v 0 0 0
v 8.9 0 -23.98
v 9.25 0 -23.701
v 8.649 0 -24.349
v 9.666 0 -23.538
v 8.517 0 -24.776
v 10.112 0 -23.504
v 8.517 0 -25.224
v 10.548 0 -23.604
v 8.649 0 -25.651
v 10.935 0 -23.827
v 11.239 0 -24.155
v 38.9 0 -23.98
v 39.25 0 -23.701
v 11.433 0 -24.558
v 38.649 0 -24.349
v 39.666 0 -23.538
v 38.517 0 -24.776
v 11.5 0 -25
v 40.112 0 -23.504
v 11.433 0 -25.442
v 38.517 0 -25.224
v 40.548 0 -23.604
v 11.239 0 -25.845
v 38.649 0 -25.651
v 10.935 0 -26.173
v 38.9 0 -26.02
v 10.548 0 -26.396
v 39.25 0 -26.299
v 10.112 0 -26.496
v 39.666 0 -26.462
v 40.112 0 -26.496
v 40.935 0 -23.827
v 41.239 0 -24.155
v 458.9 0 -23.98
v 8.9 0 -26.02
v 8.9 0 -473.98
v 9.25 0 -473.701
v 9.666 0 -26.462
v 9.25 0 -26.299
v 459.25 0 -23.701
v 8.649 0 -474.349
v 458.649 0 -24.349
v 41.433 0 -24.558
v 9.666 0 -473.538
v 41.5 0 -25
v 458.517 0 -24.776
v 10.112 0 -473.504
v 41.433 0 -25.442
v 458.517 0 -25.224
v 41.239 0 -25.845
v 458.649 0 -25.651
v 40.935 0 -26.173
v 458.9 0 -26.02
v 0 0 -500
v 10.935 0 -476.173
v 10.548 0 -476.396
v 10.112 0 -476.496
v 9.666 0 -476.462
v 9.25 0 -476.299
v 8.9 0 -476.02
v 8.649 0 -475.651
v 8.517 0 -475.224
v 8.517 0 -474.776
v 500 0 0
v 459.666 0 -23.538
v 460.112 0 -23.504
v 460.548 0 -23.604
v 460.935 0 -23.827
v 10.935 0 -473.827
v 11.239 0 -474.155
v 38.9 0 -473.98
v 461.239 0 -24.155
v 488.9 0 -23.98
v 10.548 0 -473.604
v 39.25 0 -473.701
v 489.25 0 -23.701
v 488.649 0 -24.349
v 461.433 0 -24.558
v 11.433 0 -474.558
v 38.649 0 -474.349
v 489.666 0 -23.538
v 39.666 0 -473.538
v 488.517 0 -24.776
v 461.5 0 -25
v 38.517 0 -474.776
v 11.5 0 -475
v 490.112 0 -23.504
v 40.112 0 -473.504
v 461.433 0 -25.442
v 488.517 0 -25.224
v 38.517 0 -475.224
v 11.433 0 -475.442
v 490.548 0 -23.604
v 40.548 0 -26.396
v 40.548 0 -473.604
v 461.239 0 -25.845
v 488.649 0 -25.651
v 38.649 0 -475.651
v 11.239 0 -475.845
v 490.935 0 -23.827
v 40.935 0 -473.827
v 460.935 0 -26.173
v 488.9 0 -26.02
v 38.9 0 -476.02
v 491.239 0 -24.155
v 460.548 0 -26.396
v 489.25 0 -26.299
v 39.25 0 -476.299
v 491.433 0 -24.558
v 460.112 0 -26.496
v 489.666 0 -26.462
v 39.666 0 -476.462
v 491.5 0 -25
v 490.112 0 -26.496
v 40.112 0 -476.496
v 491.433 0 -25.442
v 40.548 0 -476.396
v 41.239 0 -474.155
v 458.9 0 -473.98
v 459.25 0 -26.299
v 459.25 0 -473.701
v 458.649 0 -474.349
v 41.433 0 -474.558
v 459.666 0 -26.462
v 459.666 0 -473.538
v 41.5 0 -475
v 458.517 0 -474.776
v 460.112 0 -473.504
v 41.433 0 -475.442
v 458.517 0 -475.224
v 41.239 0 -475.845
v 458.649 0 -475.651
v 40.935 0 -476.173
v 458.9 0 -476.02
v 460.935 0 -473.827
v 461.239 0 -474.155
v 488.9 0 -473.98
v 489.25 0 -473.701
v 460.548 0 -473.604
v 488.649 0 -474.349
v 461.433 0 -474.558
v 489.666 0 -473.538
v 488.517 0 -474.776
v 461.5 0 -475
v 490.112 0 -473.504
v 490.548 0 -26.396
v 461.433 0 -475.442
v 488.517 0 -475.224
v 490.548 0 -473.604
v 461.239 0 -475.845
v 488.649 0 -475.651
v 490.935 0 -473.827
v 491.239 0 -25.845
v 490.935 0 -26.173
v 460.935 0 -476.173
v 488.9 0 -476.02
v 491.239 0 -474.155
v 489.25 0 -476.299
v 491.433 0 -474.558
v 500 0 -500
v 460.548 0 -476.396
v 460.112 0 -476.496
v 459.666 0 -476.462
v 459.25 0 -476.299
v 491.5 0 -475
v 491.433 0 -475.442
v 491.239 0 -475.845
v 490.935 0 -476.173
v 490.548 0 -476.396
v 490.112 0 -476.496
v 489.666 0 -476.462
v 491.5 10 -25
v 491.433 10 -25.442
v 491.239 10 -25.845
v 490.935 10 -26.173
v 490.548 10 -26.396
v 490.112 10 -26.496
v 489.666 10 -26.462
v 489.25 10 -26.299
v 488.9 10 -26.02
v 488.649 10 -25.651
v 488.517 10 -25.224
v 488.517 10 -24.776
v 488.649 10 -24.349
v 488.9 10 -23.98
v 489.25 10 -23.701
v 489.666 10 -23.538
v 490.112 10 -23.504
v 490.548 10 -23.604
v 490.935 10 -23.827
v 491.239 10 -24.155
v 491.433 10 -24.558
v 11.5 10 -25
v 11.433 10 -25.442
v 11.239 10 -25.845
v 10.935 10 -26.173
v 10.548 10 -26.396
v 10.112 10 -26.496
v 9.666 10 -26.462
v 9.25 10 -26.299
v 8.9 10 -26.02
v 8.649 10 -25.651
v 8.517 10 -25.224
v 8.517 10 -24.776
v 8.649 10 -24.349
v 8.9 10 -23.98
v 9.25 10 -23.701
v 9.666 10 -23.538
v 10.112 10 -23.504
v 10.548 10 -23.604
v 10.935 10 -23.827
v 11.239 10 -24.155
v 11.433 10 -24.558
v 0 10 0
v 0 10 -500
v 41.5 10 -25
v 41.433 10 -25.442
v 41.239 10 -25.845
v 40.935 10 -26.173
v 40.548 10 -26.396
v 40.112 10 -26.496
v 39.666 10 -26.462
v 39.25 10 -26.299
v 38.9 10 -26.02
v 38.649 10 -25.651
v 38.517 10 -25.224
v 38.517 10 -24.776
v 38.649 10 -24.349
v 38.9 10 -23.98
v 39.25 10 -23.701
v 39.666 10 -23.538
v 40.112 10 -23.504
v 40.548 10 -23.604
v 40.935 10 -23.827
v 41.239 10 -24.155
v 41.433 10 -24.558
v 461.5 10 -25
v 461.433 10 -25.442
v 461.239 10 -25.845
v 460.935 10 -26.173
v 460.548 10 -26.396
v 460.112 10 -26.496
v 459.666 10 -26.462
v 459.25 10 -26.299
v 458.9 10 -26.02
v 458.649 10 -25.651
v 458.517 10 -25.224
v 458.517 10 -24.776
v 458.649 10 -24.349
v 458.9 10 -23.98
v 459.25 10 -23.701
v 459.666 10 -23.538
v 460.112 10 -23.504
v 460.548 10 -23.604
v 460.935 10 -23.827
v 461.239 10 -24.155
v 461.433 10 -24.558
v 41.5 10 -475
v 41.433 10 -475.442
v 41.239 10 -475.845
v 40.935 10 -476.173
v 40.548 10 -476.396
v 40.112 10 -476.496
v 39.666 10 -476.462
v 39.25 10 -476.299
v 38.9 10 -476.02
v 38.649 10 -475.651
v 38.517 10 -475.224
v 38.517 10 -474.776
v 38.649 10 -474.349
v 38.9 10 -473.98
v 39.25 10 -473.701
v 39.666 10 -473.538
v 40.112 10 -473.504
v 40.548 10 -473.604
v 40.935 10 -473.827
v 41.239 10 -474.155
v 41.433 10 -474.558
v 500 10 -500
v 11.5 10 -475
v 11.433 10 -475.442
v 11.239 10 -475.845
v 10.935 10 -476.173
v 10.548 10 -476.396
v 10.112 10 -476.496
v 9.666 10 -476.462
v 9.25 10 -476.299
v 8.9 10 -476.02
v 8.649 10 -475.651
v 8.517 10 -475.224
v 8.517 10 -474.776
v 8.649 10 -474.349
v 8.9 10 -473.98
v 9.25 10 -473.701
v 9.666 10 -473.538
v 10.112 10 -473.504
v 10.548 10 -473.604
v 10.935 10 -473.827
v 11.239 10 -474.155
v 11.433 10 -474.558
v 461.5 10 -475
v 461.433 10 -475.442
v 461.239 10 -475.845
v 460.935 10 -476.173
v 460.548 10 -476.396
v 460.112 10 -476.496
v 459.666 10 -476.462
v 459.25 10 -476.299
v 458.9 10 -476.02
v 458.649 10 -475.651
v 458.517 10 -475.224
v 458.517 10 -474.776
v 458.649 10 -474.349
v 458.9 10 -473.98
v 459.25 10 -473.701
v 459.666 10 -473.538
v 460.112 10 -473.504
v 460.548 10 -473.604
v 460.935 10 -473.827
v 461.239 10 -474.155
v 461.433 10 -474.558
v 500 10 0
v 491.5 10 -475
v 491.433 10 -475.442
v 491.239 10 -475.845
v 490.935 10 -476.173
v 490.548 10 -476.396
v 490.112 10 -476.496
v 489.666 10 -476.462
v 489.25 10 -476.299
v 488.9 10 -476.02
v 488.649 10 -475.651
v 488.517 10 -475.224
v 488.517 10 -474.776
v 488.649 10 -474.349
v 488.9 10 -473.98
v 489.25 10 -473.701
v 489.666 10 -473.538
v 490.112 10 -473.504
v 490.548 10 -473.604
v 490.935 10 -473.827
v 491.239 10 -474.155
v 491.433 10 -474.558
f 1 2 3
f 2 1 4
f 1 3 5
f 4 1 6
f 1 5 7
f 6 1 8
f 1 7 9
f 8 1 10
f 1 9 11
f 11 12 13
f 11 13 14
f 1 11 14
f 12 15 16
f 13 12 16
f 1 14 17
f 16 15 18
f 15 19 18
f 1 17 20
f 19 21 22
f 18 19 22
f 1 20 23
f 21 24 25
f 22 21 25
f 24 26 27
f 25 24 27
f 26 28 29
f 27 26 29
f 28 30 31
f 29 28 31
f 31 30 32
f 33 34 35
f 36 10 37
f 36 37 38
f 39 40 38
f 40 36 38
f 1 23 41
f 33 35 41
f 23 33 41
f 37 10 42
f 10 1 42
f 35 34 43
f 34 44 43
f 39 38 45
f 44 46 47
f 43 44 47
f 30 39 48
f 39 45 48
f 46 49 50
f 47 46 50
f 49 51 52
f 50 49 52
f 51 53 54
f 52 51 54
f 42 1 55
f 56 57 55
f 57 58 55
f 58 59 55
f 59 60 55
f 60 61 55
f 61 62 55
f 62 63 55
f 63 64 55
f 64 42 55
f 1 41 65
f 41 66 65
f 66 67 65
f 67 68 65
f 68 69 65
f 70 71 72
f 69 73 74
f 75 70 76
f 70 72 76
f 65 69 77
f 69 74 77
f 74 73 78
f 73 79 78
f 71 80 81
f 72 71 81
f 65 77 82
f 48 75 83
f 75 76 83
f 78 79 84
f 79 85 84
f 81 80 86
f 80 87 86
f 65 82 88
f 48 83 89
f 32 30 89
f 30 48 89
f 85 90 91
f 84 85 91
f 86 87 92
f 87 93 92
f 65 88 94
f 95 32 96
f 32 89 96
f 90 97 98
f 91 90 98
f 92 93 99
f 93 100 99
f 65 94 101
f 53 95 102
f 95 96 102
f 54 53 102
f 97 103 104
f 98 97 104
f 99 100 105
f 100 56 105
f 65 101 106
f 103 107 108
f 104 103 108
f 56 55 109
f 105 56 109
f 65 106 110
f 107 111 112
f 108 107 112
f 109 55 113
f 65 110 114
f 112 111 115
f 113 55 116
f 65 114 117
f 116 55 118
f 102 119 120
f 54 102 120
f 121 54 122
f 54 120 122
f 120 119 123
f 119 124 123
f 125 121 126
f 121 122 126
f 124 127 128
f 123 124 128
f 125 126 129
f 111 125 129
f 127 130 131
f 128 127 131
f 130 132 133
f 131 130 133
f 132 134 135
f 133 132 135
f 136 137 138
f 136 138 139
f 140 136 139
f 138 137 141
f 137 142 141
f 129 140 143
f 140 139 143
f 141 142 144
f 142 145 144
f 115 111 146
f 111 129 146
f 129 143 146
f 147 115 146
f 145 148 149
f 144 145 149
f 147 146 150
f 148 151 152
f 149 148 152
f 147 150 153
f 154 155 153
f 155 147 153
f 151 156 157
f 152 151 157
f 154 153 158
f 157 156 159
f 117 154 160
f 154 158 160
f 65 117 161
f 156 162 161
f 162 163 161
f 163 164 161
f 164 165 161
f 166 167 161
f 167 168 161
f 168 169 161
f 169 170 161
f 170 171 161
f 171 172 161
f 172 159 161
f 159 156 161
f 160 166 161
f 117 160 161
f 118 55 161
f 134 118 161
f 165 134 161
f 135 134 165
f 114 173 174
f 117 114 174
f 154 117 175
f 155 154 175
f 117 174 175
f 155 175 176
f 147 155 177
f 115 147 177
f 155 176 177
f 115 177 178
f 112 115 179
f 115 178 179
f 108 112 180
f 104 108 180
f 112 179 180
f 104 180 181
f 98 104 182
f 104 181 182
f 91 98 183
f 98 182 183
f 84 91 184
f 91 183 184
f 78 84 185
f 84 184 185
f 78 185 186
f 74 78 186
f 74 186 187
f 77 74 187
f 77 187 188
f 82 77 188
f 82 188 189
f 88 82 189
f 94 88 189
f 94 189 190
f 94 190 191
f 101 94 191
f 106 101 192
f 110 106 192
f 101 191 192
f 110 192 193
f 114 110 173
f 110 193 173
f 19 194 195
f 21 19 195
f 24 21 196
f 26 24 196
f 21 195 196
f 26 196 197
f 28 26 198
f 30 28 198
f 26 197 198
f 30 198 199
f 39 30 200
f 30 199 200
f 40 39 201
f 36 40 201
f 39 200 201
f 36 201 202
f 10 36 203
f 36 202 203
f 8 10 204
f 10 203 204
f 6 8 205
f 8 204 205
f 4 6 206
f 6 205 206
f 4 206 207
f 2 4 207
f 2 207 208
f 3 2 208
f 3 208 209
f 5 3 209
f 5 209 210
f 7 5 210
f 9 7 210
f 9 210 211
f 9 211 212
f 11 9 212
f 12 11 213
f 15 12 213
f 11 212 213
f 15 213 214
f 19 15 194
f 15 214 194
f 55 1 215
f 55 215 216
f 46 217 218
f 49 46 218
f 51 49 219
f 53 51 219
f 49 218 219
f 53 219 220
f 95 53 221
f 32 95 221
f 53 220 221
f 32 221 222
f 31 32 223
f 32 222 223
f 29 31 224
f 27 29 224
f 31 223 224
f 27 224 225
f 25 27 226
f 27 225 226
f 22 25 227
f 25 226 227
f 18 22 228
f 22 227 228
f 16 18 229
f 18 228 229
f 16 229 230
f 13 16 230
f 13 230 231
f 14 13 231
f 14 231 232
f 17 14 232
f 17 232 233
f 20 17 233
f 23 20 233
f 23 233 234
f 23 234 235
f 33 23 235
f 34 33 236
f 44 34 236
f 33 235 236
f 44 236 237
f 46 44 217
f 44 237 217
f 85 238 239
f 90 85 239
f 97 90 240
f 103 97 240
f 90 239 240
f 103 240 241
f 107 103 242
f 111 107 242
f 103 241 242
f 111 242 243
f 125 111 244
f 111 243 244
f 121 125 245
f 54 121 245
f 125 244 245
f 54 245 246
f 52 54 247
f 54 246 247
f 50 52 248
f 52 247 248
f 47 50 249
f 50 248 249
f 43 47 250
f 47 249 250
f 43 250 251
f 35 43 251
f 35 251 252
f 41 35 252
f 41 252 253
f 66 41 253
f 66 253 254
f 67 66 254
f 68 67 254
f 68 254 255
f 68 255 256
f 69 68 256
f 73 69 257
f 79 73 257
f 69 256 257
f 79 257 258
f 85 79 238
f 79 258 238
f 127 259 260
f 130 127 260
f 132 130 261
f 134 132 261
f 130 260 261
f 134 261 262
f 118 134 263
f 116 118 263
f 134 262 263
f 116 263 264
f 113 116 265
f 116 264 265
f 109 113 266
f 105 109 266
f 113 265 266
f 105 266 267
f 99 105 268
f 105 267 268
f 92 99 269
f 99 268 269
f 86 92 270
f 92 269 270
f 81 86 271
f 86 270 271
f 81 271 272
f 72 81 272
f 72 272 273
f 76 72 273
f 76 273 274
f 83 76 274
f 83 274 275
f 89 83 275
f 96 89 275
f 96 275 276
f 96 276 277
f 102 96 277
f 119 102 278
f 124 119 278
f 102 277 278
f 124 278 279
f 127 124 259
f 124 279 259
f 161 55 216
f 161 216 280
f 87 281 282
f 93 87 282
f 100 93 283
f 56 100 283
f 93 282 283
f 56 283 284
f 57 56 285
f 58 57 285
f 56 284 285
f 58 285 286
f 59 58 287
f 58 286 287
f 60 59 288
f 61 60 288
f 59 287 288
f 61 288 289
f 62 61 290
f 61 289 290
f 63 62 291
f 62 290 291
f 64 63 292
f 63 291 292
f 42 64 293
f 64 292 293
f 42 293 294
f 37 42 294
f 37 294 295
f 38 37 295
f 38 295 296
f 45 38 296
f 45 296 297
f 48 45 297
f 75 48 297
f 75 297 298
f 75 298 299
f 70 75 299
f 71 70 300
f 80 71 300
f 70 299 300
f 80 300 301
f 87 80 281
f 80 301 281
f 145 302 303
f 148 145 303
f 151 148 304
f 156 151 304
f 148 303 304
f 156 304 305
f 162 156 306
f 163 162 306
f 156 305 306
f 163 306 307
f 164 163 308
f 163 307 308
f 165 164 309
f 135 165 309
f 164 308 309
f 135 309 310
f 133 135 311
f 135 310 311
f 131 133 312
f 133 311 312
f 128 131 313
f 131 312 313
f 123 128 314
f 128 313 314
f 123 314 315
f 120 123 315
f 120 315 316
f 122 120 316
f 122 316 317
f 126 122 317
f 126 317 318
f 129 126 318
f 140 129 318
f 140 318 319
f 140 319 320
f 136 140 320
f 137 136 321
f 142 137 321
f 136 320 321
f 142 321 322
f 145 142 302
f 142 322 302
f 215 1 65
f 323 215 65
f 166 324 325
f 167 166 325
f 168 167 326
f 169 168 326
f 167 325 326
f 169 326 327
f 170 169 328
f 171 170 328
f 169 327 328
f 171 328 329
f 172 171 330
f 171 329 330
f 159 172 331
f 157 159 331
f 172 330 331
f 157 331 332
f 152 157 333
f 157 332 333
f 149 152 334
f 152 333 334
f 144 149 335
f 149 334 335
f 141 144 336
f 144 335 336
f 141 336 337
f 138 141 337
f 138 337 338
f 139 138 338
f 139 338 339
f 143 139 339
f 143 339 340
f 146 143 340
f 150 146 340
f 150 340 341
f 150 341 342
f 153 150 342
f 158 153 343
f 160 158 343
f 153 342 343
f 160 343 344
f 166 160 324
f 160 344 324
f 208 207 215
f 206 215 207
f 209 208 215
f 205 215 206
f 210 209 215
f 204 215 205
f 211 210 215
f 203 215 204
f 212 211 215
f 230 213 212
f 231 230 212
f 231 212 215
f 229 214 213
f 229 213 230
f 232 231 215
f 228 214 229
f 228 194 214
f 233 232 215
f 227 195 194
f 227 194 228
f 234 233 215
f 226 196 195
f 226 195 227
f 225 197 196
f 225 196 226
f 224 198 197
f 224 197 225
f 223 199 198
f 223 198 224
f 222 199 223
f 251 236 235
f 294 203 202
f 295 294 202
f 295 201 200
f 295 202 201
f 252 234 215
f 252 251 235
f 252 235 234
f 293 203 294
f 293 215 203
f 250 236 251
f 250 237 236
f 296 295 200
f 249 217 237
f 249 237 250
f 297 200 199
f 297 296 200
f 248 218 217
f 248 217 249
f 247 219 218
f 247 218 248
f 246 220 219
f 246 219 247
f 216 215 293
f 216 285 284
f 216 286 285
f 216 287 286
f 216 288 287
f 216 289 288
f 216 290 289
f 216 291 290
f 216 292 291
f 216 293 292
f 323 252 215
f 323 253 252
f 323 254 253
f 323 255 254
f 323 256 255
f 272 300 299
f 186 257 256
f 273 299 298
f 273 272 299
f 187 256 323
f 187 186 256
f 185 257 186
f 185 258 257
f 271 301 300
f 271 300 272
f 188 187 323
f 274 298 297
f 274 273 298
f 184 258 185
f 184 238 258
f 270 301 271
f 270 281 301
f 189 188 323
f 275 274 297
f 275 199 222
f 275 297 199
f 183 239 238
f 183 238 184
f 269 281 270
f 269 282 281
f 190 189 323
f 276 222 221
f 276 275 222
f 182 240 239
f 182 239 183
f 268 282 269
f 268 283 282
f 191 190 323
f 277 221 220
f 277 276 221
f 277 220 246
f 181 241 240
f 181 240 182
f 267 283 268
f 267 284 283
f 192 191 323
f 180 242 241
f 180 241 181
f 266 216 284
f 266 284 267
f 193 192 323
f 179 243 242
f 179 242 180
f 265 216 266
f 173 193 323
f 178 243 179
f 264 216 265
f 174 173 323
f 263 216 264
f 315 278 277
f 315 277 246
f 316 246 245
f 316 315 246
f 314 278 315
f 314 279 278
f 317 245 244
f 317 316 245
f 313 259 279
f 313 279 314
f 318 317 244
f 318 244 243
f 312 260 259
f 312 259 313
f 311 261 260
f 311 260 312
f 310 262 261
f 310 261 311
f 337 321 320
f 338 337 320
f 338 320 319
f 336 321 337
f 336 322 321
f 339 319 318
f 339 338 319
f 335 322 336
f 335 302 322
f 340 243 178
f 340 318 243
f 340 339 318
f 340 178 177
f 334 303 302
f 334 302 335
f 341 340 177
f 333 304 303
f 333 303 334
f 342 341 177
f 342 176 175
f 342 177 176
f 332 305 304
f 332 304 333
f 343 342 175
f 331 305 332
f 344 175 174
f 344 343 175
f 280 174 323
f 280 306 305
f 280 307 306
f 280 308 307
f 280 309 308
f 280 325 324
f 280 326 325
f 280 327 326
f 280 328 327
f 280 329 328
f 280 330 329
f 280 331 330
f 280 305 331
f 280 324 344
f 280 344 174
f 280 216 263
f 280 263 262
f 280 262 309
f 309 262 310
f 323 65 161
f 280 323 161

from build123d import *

# Parameters (mm, degrees)
SKETCH1_W           = 500
SKETCH1_H           = 500
BOSS_EXTRUDE1_DEPTH = 10
SKETCH2_R           = 1.5
CUT_EXTRUDE1_DEPTH  = 10


with BuildPart() as part:
    # Sketch1 → Boss-Extrude1 (new body)
    with BuildSketch(Plane(origin=(0, 0, 0), x_dir=(1, 0, 0), z_dir=(0, 1, 0))):
        with Locations((250, 250)):
            Rectangle(SKETCH1_W, SKETCH1_H)
    extrude(amount=BOSS_EXTRUDE1_DEPTH)

    # Sketch2 → Cut-Extrude1 (cut)
    with BuildSketch(Plane(origin=(0, 10, 0), x_dir=(1, 0, 0), z_dir=(0, 1, 0))):
        with Locations((10, 25)):
            Circle(SKETCH2_R)
        with Locations((10, 475)):
            Circle(SKETCH2_R)
        with Locations((40, 475)):
            Circle(SKETCH2_R)
        with Locations((40, 25)):
            Circle(SKETCH2_R)
        with Locations((460, 475)):
            Circle(SKETCH2_R)
        with Locations((490, 475)):
            Circle(SKETCH2_R)
        with Locations((460, 25)):
            Circle(SKETCH2_R)
        with Locations((490, 25)):
            Circle(SKETCH2_R)
    extrude(amount=-CUT_EXTRUDE1_DEPTH, mode=Mode.SUBTRACT)


solid = part.part
